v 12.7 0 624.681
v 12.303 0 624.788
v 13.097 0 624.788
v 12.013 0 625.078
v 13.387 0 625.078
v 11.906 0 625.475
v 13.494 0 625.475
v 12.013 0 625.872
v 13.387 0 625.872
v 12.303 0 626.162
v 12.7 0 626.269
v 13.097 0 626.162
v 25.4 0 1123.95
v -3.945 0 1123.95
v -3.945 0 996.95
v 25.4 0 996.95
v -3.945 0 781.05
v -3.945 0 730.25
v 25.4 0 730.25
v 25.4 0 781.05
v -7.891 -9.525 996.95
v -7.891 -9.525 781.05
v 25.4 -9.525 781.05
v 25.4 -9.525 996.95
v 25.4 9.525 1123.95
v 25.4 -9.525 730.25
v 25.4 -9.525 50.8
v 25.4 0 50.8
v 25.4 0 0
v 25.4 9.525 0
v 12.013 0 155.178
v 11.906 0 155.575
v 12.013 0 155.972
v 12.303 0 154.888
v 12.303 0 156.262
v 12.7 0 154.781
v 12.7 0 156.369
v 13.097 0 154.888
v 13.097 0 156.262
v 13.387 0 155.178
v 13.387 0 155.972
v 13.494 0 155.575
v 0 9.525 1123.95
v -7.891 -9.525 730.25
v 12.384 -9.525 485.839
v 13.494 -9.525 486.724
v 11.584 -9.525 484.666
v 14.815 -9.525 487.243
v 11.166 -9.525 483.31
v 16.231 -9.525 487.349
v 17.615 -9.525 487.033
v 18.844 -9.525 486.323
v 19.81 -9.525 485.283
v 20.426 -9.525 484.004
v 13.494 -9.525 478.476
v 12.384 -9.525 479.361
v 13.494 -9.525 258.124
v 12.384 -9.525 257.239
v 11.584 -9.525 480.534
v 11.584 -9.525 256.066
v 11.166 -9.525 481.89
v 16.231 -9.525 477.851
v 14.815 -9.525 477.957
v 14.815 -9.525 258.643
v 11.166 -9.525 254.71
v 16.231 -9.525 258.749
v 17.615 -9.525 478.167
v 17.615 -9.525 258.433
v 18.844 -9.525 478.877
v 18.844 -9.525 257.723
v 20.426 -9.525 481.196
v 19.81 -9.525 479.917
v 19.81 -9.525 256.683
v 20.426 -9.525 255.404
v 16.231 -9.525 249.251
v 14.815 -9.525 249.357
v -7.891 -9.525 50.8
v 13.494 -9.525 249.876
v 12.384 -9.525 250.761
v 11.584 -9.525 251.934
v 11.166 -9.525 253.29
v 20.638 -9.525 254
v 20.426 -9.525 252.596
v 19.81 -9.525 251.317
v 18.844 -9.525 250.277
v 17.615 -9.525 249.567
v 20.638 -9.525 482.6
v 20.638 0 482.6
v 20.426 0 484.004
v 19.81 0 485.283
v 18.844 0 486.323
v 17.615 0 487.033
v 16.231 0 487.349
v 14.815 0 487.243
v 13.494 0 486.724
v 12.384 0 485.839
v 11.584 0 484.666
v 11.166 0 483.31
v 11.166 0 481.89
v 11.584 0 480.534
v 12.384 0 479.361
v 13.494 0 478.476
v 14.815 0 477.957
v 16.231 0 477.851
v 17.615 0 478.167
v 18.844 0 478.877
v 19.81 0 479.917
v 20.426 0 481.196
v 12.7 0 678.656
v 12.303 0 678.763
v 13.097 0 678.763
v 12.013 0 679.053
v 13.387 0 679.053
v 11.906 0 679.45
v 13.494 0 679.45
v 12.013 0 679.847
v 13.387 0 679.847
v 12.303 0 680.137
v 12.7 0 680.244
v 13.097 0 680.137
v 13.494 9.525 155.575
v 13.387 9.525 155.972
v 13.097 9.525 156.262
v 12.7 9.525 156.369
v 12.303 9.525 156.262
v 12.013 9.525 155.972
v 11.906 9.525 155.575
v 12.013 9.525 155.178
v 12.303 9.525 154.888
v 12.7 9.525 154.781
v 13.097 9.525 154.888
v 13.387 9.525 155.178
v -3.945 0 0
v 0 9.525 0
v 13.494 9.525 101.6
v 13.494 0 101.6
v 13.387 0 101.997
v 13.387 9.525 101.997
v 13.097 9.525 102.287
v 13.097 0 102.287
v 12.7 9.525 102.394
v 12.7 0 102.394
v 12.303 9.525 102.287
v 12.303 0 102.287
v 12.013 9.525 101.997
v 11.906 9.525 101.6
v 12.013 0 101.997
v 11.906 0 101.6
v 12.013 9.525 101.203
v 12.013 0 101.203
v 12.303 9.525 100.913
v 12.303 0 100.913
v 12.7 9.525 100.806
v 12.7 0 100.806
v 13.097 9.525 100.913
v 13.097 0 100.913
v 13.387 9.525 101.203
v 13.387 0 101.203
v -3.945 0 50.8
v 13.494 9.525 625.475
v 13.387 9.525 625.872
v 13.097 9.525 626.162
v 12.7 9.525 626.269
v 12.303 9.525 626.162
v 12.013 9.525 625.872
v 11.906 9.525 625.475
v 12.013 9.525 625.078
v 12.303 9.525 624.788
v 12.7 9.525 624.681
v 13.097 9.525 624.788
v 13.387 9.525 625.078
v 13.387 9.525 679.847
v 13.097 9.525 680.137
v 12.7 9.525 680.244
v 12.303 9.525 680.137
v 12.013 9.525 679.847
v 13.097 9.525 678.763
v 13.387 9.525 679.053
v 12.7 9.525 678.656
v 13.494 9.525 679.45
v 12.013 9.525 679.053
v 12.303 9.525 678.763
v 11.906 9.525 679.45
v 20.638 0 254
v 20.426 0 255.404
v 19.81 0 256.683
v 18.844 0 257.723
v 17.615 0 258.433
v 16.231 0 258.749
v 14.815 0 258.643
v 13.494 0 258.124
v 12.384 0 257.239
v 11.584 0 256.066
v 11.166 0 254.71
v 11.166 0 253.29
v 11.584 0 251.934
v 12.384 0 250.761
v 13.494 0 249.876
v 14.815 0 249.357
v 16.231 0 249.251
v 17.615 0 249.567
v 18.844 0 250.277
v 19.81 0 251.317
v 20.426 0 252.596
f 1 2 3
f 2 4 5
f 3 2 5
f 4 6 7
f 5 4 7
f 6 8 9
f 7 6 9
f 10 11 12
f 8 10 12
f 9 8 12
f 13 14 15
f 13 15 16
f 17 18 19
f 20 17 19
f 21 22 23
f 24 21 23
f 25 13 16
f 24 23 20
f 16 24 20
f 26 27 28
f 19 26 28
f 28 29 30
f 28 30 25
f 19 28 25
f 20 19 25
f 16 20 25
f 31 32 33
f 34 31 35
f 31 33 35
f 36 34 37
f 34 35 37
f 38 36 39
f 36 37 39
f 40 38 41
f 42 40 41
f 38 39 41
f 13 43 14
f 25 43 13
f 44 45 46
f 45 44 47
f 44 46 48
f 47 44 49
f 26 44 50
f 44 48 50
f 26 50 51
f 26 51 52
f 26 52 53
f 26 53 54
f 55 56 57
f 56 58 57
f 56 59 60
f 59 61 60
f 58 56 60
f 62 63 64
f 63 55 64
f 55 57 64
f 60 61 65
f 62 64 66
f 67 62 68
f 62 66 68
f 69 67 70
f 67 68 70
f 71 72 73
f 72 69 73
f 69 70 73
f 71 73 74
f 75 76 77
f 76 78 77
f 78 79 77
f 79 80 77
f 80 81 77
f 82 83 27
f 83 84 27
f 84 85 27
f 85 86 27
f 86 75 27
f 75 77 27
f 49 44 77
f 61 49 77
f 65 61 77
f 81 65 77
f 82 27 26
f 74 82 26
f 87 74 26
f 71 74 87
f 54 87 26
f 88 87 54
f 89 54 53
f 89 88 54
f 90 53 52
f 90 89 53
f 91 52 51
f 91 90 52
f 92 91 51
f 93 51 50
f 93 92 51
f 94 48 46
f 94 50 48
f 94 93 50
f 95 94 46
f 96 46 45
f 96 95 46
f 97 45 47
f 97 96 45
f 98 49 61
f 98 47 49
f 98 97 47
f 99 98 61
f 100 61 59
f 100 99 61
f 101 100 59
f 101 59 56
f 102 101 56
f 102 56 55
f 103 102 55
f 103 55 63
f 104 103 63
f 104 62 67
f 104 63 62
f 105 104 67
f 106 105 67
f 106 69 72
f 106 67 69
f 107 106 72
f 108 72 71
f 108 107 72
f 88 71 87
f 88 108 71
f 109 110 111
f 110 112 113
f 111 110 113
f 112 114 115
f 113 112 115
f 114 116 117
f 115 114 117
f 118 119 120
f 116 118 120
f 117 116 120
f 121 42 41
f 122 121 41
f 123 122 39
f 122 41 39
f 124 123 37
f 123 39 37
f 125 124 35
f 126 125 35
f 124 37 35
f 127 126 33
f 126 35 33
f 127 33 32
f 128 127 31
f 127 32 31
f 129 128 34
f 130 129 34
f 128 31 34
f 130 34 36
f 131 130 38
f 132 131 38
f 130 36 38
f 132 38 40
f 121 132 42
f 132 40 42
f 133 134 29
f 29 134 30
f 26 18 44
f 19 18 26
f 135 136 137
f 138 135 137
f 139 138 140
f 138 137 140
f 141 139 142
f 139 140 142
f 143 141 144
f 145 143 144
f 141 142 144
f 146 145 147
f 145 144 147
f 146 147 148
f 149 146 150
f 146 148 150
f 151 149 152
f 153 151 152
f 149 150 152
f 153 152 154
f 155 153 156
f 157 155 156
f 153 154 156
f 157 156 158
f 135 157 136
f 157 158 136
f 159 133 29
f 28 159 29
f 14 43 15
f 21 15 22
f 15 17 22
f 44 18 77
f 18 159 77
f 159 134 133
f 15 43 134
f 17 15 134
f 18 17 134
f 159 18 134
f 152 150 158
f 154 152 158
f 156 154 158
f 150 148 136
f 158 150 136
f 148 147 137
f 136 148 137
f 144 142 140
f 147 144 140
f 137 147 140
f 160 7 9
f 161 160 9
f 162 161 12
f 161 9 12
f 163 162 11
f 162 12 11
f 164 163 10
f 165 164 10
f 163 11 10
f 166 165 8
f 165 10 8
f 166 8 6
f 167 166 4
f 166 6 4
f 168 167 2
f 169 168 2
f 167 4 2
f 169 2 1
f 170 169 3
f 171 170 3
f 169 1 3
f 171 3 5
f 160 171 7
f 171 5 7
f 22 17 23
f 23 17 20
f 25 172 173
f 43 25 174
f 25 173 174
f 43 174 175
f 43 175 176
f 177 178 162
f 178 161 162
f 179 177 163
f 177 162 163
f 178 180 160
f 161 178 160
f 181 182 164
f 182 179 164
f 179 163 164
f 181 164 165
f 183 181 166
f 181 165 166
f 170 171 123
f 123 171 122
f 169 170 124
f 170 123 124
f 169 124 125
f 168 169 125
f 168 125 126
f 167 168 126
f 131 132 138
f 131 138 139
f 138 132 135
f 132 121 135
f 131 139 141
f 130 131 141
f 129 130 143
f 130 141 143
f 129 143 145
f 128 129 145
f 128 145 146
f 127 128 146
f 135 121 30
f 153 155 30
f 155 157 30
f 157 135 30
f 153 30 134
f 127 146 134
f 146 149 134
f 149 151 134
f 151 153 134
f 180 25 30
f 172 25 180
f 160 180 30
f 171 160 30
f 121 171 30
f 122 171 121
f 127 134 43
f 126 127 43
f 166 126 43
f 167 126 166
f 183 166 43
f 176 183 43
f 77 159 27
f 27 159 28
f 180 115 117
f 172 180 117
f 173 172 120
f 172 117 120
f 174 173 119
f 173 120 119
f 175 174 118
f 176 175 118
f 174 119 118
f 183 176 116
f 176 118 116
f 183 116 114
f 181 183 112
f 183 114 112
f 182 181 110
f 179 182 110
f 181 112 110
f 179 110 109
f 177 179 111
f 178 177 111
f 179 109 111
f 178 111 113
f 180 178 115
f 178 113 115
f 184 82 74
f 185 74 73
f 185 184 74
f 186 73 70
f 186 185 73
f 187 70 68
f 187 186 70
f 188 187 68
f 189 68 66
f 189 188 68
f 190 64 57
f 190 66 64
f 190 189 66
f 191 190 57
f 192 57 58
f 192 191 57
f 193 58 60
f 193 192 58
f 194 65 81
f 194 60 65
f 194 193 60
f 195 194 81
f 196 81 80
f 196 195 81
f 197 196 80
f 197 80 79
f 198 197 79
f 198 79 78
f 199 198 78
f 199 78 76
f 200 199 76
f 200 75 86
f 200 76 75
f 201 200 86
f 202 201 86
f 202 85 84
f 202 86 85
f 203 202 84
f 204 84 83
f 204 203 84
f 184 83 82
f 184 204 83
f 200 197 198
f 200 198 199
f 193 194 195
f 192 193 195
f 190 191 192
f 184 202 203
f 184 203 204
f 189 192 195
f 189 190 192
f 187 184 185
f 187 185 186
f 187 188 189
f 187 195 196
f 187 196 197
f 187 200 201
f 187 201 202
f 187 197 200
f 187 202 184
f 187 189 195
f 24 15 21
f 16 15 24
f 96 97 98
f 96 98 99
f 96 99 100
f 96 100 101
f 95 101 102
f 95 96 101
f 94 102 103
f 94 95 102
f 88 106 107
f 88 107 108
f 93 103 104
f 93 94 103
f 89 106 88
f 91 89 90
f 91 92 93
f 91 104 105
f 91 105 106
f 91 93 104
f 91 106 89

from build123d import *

# Parameters (mm, degrees)
F1_DEPTH = 1123.95
F2_W     = 122.435573
F2_H     = 50.8
F2_W_2   = 93.867282
F2_W_3   = 343.160421
F2_H_2   = 127
F3_DEPTH = 25.4
F4_R     = 0.79375
F5_DEPTH = 25.4
F6_R     = 4.7625
F7_DEPTH = 25.4


with BuildPart() as f1:
    # F0 (on Top) → F1 (new body)
    with BuildSketch(Plane.XY):
        Polygon((25.4, -9.525), (25.4, 9.525), (0, 9.525), (-7.890768, -9.525), align=None)
    extrude(amount=F1_DEPTH)

    # F2 (on Front) → F3 (cut)
    with BuildSketch(Plane.XZ):
        with Locations((22.446524, 25.4)):
            Rectangle(F2_W, F2_H)
        with Locations((2.720783, 755.65)):
            Rectangle(F2_W_2, F2_H)
        with Locations((-38.781822, 1060.45)):
            Rectangle(F2_W_3, F2_H_2)
    extrude(amount=F3_DEPTH, mode=Mode.SUBTRACT)

    # F4 (on Front) → F5 (cut)
    with BuildSketch(Plane.XZ):
        with Locations((12.7, 101.6)):
            Circle(F4_R)
        with Locations((12.7, 155.575)):
            Circle(F4_R)
        with Locations((12.7, 625.475)):
            Circle(F4_R)
        with Locations((12.7, 679.45)):
            Circle(F4_R)
        with Locations((-12.7, 625.475)):
            Circle(F4_R)
        with Locations((-12.7, 679.45)):
            Circle(F4_R)
        with Locations((-12.7, 101.6)):
            Circle(F4_R)
        with Locations((-12.7, 155.575)):
            Circle(F4_R)
    extrude(amount=-F5_DEPTH, mode=Mode.SUBTRACT)

    # F6 (on Front) → F7 (cut)
    with BuildSketch(Plane.XZ):
        with Locations((15.875, 254)):
            Circle(F6_R)
        with Locations((15.875, 482.6)):
            Circle(F6_R)
    extrude(amount=F7_DEPTH, mode=Mode.SUBTRACT)


solid = f1.part
